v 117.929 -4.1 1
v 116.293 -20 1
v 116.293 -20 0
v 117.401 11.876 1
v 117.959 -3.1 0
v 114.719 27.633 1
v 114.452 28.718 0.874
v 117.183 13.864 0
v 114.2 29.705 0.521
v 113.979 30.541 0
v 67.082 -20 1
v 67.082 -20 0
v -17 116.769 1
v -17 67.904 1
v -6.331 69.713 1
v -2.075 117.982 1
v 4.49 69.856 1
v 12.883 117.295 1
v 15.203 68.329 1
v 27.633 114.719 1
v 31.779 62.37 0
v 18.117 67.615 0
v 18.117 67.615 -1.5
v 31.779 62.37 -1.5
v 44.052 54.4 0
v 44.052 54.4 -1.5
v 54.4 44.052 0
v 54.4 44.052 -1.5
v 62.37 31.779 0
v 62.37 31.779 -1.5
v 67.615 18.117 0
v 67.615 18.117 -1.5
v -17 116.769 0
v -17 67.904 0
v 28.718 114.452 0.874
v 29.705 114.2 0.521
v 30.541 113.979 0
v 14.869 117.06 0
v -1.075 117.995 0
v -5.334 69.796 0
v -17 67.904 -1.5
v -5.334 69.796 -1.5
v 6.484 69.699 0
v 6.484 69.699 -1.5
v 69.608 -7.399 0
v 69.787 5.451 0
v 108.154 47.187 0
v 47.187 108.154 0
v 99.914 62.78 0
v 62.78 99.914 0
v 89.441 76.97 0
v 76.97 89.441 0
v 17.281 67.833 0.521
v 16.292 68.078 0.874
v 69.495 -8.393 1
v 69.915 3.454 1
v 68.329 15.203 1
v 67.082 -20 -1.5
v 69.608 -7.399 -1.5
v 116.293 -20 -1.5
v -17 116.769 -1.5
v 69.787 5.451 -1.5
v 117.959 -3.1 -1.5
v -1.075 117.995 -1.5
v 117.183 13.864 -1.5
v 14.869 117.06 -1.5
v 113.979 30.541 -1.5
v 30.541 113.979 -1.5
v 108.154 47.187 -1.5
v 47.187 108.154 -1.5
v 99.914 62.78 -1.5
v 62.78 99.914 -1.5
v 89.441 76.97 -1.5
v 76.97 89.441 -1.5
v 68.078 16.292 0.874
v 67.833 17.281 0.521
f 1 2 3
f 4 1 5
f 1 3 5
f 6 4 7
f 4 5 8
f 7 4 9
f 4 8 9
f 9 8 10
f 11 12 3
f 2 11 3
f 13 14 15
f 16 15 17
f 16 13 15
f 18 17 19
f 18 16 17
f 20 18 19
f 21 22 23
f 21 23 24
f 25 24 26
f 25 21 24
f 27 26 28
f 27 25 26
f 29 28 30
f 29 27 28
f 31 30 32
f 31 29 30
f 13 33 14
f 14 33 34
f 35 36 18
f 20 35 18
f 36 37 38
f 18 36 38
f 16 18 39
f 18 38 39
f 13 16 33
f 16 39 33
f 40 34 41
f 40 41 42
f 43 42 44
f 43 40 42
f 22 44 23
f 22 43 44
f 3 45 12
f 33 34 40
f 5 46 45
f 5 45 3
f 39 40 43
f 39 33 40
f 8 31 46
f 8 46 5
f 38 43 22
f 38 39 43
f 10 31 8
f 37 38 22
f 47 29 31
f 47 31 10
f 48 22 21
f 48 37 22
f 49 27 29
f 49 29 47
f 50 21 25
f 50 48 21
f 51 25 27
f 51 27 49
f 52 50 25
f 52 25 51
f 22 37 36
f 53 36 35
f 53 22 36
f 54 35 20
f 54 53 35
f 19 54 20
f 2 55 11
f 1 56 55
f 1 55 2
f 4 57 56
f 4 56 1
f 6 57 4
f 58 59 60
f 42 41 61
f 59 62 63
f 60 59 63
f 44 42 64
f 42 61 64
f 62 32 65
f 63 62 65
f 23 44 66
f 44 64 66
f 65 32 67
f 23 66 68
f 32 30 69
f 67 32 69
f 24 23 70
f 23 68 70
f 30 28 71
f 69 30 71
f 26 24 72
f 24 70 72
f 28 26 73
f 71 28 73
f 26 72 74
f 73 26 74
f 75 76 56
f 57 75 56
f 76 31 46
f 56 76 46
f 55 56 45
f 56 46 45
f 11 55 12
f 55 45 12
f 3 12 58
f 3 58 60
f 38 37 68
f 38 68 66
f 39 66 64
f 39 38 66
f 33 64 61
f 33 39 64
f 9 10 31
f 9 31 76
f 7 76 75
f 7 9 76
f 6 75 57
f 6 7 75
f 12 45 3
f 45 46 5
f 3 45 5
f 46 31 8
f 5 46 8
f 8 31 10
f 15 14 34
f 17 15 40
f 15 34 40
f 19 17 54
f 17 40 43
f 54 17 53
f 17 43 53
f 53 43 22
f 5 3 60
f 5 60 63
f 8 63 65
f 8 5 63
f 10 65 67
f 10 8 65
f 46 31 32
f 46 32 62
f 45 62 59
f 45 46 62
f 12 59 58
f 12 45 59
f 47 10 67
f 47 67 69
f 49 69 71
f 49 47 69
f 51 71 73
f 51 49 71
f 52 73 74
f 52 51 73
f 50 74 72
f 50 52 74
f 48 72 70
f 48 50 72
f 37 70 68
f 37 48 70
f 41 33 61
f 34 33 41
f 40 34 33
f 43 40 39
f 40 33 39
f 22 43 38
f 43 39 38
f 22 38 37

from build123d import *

# Parameters (mm, degrees)
F1_DEPTH      = 1
F2_DEPTH      = 1.5
F3_SIZE       = 0.99999
F3_2_SIZE     = 0.99999
F4_T1_DEPTH   = 58.00296827
F4_2_T1_DEPTH = 58.00296827


# Not quite as in the source:
# - a fillet or chamfer that OpenCascade refuses, or shapes differently, is made with other operations: its cross-section is extruded or revolved along the edge and cut away or added
# - a fillet or chamfer is up to 0.001 mm smaller than in the source, because OpenCascade refuses the exact size


with BuildPart() as f1:
    # F0 (on Top) → F1 (new body)
    with BuildSketch(Plane.XY):
        with BuildLine():
            ThreePointArc((-17, 67.9043444855), (0.5771188901, 69.9976209152), (18.1173331572, 67.6148078402))
            Line((18.1173331572, 67.6148078402), (30.5406678037, 113.9793239405))
            ThreePointArc((30.5406678037, 113.9793239405), (6.9125327944, 117.7974344635), (-17, 116.7690827053))
            Line((-17, 116.7690827053), (-17, 67.9043444855))
        make_face()
    extrude(amount=F1_DEPTH)

    # F3 (size 1 in the source; OpenCascade refuses exactly that, so slightly less here)
    f3_edges = [f1.edges().sort_by_distance(p)[0] for p in [
        (24.329, 90.797066, 1),
    ]]
    chamfer(f3_edges, length=F3_SIZE)

    # F4: fillet of radius 5 on 1 edges, made by hand

    # F4_s2 → F4_t1 (cut)
    with BuildSketch(Plane(origin=(16.8213913237, 62.778287074, 0), x_dir=(0, 0, 1), z_dir=(0.2588190451, 0.9659258263, 0))):
        with BuildLine():
            ThreePointArc((1e-05, 0), (0.7434191255, -1.4188557423), (1, -2.9999866666))
            Line((1, -2.9999866666), (1, -0.99999))
            Line((1, -0.99999), (1e-05, 0))
        make_face()
    extrude(amount=F4_T1_DEPTH, mode=Mode.SUBTRACT)


with BuildPart() as f1b:
    # F0 (on Top) → F1, piece 2 (new body)
    with BuildSketch(Plane.XY):
        with BuildLine():
            ThreePointArc((67.6148078402, 18.1173331572), (69.9931634577, -0.9782991276), (67.082039325, -20))
            Line((67.082039325, -20), (116.2928143774, -20))
            ThreePointArc((116.2928143774, -20), (117.8766482255, 5.3957834406), (113.9793239405, 30.5406678037))
            Line((113.9793239405, 30.5406678037), (67.6148078402, 18.1173331572))
        make_face()
    extrude(amount=F1_DEPTH)

    # F3#2 (size 1 in the source; OpenCascade refuses exactly that, so slightly less here)
    f3_2_edges = [f1b.edges().sort_by_distance(p)[0] for p in [
        (90.797066, 24.329, 1),
    ]]
    chamfer(f3_2_edges, length=F3_2_SIZE)

    # F4#2: fillet of radius 5 on 1 edges, made by hand

    # F4_2_s2 → F4_2_t1 (cut)
    with BuildSketch(Plane(origin=(118.8048521275, 31.8336641845, 0), x_dir=(0, 0, 1), z_dir=(-0.9659258263, -0.2588190451, 0))):
        with BuildLine():
            ThreePointArc((1e-05, 0), (0.7434191255, -1.4188557423), (1, -2.9999866666))
            Line((1, -2.9999866666), (1, -0.99999))
            Line((1, -0.99999), (1e-05, 0))
        make_face()
    extrude(amount=F4_2_T1_DEPTH, mode=Mode.SUBTRACT)


with BuildPart() as f2:
    # F0 (on Top) → F2 (new body)
    with BuildSketch(Plane.XY):
        with BuildLine():
            ThreePointArc((-17, 67.9043444855), (0.5771188901, 69.9976209152), (18.1173331572, 67.6148078402))
            Line((18.1173331572, 67.6148078402), (30.5406678037, 113.9793239405))
            ThreePointArc((30.5406678037, 113.9793239405), (6.9125327944, 117.7974344635), (-17, 116.7690827053))
            Line((-17, 116.7690827053), (-17, 67.9043444855))
        make_face()
        with BuildLine():
            ThreePointArc((18.1173331572, 67.6148078402), (49.4974746831, 49.4974746831), (67.6148078402, 18.1173331572))
            Line((67.6148078402, 18.1173331572), (113.9793239405, 30.5406678037))
            ThreePointArc((113.9793239405, 30.5406678037), (83.4386561368, 83.4386561368), (30.5406678037, 113.9793239405))
            Line((30.5406678037, 113.9793239405), (18.1173331572, 67.6148078402))
        make_face()
        with BuildLine():
            ThreePointArc((67.6148078402, 18.1173331572), (69.9931634577, -0.9782991276), (67.082039325, -20))
            Line((67.082039325, -20), (116.2928143774, -20))
            ThreePointArc((116.2928143774, -20), (117.8766482255, 5.3957834406), (113.9793239405, 30.5406678037))
            Line((113.9793239405, 30.5406678037), (67.6148078402, 18.1173331572))
        make_face()
    extrude(amount=-F2_DEPTH)


solid = Compound([f1.part, f1b.part, f2.part])
